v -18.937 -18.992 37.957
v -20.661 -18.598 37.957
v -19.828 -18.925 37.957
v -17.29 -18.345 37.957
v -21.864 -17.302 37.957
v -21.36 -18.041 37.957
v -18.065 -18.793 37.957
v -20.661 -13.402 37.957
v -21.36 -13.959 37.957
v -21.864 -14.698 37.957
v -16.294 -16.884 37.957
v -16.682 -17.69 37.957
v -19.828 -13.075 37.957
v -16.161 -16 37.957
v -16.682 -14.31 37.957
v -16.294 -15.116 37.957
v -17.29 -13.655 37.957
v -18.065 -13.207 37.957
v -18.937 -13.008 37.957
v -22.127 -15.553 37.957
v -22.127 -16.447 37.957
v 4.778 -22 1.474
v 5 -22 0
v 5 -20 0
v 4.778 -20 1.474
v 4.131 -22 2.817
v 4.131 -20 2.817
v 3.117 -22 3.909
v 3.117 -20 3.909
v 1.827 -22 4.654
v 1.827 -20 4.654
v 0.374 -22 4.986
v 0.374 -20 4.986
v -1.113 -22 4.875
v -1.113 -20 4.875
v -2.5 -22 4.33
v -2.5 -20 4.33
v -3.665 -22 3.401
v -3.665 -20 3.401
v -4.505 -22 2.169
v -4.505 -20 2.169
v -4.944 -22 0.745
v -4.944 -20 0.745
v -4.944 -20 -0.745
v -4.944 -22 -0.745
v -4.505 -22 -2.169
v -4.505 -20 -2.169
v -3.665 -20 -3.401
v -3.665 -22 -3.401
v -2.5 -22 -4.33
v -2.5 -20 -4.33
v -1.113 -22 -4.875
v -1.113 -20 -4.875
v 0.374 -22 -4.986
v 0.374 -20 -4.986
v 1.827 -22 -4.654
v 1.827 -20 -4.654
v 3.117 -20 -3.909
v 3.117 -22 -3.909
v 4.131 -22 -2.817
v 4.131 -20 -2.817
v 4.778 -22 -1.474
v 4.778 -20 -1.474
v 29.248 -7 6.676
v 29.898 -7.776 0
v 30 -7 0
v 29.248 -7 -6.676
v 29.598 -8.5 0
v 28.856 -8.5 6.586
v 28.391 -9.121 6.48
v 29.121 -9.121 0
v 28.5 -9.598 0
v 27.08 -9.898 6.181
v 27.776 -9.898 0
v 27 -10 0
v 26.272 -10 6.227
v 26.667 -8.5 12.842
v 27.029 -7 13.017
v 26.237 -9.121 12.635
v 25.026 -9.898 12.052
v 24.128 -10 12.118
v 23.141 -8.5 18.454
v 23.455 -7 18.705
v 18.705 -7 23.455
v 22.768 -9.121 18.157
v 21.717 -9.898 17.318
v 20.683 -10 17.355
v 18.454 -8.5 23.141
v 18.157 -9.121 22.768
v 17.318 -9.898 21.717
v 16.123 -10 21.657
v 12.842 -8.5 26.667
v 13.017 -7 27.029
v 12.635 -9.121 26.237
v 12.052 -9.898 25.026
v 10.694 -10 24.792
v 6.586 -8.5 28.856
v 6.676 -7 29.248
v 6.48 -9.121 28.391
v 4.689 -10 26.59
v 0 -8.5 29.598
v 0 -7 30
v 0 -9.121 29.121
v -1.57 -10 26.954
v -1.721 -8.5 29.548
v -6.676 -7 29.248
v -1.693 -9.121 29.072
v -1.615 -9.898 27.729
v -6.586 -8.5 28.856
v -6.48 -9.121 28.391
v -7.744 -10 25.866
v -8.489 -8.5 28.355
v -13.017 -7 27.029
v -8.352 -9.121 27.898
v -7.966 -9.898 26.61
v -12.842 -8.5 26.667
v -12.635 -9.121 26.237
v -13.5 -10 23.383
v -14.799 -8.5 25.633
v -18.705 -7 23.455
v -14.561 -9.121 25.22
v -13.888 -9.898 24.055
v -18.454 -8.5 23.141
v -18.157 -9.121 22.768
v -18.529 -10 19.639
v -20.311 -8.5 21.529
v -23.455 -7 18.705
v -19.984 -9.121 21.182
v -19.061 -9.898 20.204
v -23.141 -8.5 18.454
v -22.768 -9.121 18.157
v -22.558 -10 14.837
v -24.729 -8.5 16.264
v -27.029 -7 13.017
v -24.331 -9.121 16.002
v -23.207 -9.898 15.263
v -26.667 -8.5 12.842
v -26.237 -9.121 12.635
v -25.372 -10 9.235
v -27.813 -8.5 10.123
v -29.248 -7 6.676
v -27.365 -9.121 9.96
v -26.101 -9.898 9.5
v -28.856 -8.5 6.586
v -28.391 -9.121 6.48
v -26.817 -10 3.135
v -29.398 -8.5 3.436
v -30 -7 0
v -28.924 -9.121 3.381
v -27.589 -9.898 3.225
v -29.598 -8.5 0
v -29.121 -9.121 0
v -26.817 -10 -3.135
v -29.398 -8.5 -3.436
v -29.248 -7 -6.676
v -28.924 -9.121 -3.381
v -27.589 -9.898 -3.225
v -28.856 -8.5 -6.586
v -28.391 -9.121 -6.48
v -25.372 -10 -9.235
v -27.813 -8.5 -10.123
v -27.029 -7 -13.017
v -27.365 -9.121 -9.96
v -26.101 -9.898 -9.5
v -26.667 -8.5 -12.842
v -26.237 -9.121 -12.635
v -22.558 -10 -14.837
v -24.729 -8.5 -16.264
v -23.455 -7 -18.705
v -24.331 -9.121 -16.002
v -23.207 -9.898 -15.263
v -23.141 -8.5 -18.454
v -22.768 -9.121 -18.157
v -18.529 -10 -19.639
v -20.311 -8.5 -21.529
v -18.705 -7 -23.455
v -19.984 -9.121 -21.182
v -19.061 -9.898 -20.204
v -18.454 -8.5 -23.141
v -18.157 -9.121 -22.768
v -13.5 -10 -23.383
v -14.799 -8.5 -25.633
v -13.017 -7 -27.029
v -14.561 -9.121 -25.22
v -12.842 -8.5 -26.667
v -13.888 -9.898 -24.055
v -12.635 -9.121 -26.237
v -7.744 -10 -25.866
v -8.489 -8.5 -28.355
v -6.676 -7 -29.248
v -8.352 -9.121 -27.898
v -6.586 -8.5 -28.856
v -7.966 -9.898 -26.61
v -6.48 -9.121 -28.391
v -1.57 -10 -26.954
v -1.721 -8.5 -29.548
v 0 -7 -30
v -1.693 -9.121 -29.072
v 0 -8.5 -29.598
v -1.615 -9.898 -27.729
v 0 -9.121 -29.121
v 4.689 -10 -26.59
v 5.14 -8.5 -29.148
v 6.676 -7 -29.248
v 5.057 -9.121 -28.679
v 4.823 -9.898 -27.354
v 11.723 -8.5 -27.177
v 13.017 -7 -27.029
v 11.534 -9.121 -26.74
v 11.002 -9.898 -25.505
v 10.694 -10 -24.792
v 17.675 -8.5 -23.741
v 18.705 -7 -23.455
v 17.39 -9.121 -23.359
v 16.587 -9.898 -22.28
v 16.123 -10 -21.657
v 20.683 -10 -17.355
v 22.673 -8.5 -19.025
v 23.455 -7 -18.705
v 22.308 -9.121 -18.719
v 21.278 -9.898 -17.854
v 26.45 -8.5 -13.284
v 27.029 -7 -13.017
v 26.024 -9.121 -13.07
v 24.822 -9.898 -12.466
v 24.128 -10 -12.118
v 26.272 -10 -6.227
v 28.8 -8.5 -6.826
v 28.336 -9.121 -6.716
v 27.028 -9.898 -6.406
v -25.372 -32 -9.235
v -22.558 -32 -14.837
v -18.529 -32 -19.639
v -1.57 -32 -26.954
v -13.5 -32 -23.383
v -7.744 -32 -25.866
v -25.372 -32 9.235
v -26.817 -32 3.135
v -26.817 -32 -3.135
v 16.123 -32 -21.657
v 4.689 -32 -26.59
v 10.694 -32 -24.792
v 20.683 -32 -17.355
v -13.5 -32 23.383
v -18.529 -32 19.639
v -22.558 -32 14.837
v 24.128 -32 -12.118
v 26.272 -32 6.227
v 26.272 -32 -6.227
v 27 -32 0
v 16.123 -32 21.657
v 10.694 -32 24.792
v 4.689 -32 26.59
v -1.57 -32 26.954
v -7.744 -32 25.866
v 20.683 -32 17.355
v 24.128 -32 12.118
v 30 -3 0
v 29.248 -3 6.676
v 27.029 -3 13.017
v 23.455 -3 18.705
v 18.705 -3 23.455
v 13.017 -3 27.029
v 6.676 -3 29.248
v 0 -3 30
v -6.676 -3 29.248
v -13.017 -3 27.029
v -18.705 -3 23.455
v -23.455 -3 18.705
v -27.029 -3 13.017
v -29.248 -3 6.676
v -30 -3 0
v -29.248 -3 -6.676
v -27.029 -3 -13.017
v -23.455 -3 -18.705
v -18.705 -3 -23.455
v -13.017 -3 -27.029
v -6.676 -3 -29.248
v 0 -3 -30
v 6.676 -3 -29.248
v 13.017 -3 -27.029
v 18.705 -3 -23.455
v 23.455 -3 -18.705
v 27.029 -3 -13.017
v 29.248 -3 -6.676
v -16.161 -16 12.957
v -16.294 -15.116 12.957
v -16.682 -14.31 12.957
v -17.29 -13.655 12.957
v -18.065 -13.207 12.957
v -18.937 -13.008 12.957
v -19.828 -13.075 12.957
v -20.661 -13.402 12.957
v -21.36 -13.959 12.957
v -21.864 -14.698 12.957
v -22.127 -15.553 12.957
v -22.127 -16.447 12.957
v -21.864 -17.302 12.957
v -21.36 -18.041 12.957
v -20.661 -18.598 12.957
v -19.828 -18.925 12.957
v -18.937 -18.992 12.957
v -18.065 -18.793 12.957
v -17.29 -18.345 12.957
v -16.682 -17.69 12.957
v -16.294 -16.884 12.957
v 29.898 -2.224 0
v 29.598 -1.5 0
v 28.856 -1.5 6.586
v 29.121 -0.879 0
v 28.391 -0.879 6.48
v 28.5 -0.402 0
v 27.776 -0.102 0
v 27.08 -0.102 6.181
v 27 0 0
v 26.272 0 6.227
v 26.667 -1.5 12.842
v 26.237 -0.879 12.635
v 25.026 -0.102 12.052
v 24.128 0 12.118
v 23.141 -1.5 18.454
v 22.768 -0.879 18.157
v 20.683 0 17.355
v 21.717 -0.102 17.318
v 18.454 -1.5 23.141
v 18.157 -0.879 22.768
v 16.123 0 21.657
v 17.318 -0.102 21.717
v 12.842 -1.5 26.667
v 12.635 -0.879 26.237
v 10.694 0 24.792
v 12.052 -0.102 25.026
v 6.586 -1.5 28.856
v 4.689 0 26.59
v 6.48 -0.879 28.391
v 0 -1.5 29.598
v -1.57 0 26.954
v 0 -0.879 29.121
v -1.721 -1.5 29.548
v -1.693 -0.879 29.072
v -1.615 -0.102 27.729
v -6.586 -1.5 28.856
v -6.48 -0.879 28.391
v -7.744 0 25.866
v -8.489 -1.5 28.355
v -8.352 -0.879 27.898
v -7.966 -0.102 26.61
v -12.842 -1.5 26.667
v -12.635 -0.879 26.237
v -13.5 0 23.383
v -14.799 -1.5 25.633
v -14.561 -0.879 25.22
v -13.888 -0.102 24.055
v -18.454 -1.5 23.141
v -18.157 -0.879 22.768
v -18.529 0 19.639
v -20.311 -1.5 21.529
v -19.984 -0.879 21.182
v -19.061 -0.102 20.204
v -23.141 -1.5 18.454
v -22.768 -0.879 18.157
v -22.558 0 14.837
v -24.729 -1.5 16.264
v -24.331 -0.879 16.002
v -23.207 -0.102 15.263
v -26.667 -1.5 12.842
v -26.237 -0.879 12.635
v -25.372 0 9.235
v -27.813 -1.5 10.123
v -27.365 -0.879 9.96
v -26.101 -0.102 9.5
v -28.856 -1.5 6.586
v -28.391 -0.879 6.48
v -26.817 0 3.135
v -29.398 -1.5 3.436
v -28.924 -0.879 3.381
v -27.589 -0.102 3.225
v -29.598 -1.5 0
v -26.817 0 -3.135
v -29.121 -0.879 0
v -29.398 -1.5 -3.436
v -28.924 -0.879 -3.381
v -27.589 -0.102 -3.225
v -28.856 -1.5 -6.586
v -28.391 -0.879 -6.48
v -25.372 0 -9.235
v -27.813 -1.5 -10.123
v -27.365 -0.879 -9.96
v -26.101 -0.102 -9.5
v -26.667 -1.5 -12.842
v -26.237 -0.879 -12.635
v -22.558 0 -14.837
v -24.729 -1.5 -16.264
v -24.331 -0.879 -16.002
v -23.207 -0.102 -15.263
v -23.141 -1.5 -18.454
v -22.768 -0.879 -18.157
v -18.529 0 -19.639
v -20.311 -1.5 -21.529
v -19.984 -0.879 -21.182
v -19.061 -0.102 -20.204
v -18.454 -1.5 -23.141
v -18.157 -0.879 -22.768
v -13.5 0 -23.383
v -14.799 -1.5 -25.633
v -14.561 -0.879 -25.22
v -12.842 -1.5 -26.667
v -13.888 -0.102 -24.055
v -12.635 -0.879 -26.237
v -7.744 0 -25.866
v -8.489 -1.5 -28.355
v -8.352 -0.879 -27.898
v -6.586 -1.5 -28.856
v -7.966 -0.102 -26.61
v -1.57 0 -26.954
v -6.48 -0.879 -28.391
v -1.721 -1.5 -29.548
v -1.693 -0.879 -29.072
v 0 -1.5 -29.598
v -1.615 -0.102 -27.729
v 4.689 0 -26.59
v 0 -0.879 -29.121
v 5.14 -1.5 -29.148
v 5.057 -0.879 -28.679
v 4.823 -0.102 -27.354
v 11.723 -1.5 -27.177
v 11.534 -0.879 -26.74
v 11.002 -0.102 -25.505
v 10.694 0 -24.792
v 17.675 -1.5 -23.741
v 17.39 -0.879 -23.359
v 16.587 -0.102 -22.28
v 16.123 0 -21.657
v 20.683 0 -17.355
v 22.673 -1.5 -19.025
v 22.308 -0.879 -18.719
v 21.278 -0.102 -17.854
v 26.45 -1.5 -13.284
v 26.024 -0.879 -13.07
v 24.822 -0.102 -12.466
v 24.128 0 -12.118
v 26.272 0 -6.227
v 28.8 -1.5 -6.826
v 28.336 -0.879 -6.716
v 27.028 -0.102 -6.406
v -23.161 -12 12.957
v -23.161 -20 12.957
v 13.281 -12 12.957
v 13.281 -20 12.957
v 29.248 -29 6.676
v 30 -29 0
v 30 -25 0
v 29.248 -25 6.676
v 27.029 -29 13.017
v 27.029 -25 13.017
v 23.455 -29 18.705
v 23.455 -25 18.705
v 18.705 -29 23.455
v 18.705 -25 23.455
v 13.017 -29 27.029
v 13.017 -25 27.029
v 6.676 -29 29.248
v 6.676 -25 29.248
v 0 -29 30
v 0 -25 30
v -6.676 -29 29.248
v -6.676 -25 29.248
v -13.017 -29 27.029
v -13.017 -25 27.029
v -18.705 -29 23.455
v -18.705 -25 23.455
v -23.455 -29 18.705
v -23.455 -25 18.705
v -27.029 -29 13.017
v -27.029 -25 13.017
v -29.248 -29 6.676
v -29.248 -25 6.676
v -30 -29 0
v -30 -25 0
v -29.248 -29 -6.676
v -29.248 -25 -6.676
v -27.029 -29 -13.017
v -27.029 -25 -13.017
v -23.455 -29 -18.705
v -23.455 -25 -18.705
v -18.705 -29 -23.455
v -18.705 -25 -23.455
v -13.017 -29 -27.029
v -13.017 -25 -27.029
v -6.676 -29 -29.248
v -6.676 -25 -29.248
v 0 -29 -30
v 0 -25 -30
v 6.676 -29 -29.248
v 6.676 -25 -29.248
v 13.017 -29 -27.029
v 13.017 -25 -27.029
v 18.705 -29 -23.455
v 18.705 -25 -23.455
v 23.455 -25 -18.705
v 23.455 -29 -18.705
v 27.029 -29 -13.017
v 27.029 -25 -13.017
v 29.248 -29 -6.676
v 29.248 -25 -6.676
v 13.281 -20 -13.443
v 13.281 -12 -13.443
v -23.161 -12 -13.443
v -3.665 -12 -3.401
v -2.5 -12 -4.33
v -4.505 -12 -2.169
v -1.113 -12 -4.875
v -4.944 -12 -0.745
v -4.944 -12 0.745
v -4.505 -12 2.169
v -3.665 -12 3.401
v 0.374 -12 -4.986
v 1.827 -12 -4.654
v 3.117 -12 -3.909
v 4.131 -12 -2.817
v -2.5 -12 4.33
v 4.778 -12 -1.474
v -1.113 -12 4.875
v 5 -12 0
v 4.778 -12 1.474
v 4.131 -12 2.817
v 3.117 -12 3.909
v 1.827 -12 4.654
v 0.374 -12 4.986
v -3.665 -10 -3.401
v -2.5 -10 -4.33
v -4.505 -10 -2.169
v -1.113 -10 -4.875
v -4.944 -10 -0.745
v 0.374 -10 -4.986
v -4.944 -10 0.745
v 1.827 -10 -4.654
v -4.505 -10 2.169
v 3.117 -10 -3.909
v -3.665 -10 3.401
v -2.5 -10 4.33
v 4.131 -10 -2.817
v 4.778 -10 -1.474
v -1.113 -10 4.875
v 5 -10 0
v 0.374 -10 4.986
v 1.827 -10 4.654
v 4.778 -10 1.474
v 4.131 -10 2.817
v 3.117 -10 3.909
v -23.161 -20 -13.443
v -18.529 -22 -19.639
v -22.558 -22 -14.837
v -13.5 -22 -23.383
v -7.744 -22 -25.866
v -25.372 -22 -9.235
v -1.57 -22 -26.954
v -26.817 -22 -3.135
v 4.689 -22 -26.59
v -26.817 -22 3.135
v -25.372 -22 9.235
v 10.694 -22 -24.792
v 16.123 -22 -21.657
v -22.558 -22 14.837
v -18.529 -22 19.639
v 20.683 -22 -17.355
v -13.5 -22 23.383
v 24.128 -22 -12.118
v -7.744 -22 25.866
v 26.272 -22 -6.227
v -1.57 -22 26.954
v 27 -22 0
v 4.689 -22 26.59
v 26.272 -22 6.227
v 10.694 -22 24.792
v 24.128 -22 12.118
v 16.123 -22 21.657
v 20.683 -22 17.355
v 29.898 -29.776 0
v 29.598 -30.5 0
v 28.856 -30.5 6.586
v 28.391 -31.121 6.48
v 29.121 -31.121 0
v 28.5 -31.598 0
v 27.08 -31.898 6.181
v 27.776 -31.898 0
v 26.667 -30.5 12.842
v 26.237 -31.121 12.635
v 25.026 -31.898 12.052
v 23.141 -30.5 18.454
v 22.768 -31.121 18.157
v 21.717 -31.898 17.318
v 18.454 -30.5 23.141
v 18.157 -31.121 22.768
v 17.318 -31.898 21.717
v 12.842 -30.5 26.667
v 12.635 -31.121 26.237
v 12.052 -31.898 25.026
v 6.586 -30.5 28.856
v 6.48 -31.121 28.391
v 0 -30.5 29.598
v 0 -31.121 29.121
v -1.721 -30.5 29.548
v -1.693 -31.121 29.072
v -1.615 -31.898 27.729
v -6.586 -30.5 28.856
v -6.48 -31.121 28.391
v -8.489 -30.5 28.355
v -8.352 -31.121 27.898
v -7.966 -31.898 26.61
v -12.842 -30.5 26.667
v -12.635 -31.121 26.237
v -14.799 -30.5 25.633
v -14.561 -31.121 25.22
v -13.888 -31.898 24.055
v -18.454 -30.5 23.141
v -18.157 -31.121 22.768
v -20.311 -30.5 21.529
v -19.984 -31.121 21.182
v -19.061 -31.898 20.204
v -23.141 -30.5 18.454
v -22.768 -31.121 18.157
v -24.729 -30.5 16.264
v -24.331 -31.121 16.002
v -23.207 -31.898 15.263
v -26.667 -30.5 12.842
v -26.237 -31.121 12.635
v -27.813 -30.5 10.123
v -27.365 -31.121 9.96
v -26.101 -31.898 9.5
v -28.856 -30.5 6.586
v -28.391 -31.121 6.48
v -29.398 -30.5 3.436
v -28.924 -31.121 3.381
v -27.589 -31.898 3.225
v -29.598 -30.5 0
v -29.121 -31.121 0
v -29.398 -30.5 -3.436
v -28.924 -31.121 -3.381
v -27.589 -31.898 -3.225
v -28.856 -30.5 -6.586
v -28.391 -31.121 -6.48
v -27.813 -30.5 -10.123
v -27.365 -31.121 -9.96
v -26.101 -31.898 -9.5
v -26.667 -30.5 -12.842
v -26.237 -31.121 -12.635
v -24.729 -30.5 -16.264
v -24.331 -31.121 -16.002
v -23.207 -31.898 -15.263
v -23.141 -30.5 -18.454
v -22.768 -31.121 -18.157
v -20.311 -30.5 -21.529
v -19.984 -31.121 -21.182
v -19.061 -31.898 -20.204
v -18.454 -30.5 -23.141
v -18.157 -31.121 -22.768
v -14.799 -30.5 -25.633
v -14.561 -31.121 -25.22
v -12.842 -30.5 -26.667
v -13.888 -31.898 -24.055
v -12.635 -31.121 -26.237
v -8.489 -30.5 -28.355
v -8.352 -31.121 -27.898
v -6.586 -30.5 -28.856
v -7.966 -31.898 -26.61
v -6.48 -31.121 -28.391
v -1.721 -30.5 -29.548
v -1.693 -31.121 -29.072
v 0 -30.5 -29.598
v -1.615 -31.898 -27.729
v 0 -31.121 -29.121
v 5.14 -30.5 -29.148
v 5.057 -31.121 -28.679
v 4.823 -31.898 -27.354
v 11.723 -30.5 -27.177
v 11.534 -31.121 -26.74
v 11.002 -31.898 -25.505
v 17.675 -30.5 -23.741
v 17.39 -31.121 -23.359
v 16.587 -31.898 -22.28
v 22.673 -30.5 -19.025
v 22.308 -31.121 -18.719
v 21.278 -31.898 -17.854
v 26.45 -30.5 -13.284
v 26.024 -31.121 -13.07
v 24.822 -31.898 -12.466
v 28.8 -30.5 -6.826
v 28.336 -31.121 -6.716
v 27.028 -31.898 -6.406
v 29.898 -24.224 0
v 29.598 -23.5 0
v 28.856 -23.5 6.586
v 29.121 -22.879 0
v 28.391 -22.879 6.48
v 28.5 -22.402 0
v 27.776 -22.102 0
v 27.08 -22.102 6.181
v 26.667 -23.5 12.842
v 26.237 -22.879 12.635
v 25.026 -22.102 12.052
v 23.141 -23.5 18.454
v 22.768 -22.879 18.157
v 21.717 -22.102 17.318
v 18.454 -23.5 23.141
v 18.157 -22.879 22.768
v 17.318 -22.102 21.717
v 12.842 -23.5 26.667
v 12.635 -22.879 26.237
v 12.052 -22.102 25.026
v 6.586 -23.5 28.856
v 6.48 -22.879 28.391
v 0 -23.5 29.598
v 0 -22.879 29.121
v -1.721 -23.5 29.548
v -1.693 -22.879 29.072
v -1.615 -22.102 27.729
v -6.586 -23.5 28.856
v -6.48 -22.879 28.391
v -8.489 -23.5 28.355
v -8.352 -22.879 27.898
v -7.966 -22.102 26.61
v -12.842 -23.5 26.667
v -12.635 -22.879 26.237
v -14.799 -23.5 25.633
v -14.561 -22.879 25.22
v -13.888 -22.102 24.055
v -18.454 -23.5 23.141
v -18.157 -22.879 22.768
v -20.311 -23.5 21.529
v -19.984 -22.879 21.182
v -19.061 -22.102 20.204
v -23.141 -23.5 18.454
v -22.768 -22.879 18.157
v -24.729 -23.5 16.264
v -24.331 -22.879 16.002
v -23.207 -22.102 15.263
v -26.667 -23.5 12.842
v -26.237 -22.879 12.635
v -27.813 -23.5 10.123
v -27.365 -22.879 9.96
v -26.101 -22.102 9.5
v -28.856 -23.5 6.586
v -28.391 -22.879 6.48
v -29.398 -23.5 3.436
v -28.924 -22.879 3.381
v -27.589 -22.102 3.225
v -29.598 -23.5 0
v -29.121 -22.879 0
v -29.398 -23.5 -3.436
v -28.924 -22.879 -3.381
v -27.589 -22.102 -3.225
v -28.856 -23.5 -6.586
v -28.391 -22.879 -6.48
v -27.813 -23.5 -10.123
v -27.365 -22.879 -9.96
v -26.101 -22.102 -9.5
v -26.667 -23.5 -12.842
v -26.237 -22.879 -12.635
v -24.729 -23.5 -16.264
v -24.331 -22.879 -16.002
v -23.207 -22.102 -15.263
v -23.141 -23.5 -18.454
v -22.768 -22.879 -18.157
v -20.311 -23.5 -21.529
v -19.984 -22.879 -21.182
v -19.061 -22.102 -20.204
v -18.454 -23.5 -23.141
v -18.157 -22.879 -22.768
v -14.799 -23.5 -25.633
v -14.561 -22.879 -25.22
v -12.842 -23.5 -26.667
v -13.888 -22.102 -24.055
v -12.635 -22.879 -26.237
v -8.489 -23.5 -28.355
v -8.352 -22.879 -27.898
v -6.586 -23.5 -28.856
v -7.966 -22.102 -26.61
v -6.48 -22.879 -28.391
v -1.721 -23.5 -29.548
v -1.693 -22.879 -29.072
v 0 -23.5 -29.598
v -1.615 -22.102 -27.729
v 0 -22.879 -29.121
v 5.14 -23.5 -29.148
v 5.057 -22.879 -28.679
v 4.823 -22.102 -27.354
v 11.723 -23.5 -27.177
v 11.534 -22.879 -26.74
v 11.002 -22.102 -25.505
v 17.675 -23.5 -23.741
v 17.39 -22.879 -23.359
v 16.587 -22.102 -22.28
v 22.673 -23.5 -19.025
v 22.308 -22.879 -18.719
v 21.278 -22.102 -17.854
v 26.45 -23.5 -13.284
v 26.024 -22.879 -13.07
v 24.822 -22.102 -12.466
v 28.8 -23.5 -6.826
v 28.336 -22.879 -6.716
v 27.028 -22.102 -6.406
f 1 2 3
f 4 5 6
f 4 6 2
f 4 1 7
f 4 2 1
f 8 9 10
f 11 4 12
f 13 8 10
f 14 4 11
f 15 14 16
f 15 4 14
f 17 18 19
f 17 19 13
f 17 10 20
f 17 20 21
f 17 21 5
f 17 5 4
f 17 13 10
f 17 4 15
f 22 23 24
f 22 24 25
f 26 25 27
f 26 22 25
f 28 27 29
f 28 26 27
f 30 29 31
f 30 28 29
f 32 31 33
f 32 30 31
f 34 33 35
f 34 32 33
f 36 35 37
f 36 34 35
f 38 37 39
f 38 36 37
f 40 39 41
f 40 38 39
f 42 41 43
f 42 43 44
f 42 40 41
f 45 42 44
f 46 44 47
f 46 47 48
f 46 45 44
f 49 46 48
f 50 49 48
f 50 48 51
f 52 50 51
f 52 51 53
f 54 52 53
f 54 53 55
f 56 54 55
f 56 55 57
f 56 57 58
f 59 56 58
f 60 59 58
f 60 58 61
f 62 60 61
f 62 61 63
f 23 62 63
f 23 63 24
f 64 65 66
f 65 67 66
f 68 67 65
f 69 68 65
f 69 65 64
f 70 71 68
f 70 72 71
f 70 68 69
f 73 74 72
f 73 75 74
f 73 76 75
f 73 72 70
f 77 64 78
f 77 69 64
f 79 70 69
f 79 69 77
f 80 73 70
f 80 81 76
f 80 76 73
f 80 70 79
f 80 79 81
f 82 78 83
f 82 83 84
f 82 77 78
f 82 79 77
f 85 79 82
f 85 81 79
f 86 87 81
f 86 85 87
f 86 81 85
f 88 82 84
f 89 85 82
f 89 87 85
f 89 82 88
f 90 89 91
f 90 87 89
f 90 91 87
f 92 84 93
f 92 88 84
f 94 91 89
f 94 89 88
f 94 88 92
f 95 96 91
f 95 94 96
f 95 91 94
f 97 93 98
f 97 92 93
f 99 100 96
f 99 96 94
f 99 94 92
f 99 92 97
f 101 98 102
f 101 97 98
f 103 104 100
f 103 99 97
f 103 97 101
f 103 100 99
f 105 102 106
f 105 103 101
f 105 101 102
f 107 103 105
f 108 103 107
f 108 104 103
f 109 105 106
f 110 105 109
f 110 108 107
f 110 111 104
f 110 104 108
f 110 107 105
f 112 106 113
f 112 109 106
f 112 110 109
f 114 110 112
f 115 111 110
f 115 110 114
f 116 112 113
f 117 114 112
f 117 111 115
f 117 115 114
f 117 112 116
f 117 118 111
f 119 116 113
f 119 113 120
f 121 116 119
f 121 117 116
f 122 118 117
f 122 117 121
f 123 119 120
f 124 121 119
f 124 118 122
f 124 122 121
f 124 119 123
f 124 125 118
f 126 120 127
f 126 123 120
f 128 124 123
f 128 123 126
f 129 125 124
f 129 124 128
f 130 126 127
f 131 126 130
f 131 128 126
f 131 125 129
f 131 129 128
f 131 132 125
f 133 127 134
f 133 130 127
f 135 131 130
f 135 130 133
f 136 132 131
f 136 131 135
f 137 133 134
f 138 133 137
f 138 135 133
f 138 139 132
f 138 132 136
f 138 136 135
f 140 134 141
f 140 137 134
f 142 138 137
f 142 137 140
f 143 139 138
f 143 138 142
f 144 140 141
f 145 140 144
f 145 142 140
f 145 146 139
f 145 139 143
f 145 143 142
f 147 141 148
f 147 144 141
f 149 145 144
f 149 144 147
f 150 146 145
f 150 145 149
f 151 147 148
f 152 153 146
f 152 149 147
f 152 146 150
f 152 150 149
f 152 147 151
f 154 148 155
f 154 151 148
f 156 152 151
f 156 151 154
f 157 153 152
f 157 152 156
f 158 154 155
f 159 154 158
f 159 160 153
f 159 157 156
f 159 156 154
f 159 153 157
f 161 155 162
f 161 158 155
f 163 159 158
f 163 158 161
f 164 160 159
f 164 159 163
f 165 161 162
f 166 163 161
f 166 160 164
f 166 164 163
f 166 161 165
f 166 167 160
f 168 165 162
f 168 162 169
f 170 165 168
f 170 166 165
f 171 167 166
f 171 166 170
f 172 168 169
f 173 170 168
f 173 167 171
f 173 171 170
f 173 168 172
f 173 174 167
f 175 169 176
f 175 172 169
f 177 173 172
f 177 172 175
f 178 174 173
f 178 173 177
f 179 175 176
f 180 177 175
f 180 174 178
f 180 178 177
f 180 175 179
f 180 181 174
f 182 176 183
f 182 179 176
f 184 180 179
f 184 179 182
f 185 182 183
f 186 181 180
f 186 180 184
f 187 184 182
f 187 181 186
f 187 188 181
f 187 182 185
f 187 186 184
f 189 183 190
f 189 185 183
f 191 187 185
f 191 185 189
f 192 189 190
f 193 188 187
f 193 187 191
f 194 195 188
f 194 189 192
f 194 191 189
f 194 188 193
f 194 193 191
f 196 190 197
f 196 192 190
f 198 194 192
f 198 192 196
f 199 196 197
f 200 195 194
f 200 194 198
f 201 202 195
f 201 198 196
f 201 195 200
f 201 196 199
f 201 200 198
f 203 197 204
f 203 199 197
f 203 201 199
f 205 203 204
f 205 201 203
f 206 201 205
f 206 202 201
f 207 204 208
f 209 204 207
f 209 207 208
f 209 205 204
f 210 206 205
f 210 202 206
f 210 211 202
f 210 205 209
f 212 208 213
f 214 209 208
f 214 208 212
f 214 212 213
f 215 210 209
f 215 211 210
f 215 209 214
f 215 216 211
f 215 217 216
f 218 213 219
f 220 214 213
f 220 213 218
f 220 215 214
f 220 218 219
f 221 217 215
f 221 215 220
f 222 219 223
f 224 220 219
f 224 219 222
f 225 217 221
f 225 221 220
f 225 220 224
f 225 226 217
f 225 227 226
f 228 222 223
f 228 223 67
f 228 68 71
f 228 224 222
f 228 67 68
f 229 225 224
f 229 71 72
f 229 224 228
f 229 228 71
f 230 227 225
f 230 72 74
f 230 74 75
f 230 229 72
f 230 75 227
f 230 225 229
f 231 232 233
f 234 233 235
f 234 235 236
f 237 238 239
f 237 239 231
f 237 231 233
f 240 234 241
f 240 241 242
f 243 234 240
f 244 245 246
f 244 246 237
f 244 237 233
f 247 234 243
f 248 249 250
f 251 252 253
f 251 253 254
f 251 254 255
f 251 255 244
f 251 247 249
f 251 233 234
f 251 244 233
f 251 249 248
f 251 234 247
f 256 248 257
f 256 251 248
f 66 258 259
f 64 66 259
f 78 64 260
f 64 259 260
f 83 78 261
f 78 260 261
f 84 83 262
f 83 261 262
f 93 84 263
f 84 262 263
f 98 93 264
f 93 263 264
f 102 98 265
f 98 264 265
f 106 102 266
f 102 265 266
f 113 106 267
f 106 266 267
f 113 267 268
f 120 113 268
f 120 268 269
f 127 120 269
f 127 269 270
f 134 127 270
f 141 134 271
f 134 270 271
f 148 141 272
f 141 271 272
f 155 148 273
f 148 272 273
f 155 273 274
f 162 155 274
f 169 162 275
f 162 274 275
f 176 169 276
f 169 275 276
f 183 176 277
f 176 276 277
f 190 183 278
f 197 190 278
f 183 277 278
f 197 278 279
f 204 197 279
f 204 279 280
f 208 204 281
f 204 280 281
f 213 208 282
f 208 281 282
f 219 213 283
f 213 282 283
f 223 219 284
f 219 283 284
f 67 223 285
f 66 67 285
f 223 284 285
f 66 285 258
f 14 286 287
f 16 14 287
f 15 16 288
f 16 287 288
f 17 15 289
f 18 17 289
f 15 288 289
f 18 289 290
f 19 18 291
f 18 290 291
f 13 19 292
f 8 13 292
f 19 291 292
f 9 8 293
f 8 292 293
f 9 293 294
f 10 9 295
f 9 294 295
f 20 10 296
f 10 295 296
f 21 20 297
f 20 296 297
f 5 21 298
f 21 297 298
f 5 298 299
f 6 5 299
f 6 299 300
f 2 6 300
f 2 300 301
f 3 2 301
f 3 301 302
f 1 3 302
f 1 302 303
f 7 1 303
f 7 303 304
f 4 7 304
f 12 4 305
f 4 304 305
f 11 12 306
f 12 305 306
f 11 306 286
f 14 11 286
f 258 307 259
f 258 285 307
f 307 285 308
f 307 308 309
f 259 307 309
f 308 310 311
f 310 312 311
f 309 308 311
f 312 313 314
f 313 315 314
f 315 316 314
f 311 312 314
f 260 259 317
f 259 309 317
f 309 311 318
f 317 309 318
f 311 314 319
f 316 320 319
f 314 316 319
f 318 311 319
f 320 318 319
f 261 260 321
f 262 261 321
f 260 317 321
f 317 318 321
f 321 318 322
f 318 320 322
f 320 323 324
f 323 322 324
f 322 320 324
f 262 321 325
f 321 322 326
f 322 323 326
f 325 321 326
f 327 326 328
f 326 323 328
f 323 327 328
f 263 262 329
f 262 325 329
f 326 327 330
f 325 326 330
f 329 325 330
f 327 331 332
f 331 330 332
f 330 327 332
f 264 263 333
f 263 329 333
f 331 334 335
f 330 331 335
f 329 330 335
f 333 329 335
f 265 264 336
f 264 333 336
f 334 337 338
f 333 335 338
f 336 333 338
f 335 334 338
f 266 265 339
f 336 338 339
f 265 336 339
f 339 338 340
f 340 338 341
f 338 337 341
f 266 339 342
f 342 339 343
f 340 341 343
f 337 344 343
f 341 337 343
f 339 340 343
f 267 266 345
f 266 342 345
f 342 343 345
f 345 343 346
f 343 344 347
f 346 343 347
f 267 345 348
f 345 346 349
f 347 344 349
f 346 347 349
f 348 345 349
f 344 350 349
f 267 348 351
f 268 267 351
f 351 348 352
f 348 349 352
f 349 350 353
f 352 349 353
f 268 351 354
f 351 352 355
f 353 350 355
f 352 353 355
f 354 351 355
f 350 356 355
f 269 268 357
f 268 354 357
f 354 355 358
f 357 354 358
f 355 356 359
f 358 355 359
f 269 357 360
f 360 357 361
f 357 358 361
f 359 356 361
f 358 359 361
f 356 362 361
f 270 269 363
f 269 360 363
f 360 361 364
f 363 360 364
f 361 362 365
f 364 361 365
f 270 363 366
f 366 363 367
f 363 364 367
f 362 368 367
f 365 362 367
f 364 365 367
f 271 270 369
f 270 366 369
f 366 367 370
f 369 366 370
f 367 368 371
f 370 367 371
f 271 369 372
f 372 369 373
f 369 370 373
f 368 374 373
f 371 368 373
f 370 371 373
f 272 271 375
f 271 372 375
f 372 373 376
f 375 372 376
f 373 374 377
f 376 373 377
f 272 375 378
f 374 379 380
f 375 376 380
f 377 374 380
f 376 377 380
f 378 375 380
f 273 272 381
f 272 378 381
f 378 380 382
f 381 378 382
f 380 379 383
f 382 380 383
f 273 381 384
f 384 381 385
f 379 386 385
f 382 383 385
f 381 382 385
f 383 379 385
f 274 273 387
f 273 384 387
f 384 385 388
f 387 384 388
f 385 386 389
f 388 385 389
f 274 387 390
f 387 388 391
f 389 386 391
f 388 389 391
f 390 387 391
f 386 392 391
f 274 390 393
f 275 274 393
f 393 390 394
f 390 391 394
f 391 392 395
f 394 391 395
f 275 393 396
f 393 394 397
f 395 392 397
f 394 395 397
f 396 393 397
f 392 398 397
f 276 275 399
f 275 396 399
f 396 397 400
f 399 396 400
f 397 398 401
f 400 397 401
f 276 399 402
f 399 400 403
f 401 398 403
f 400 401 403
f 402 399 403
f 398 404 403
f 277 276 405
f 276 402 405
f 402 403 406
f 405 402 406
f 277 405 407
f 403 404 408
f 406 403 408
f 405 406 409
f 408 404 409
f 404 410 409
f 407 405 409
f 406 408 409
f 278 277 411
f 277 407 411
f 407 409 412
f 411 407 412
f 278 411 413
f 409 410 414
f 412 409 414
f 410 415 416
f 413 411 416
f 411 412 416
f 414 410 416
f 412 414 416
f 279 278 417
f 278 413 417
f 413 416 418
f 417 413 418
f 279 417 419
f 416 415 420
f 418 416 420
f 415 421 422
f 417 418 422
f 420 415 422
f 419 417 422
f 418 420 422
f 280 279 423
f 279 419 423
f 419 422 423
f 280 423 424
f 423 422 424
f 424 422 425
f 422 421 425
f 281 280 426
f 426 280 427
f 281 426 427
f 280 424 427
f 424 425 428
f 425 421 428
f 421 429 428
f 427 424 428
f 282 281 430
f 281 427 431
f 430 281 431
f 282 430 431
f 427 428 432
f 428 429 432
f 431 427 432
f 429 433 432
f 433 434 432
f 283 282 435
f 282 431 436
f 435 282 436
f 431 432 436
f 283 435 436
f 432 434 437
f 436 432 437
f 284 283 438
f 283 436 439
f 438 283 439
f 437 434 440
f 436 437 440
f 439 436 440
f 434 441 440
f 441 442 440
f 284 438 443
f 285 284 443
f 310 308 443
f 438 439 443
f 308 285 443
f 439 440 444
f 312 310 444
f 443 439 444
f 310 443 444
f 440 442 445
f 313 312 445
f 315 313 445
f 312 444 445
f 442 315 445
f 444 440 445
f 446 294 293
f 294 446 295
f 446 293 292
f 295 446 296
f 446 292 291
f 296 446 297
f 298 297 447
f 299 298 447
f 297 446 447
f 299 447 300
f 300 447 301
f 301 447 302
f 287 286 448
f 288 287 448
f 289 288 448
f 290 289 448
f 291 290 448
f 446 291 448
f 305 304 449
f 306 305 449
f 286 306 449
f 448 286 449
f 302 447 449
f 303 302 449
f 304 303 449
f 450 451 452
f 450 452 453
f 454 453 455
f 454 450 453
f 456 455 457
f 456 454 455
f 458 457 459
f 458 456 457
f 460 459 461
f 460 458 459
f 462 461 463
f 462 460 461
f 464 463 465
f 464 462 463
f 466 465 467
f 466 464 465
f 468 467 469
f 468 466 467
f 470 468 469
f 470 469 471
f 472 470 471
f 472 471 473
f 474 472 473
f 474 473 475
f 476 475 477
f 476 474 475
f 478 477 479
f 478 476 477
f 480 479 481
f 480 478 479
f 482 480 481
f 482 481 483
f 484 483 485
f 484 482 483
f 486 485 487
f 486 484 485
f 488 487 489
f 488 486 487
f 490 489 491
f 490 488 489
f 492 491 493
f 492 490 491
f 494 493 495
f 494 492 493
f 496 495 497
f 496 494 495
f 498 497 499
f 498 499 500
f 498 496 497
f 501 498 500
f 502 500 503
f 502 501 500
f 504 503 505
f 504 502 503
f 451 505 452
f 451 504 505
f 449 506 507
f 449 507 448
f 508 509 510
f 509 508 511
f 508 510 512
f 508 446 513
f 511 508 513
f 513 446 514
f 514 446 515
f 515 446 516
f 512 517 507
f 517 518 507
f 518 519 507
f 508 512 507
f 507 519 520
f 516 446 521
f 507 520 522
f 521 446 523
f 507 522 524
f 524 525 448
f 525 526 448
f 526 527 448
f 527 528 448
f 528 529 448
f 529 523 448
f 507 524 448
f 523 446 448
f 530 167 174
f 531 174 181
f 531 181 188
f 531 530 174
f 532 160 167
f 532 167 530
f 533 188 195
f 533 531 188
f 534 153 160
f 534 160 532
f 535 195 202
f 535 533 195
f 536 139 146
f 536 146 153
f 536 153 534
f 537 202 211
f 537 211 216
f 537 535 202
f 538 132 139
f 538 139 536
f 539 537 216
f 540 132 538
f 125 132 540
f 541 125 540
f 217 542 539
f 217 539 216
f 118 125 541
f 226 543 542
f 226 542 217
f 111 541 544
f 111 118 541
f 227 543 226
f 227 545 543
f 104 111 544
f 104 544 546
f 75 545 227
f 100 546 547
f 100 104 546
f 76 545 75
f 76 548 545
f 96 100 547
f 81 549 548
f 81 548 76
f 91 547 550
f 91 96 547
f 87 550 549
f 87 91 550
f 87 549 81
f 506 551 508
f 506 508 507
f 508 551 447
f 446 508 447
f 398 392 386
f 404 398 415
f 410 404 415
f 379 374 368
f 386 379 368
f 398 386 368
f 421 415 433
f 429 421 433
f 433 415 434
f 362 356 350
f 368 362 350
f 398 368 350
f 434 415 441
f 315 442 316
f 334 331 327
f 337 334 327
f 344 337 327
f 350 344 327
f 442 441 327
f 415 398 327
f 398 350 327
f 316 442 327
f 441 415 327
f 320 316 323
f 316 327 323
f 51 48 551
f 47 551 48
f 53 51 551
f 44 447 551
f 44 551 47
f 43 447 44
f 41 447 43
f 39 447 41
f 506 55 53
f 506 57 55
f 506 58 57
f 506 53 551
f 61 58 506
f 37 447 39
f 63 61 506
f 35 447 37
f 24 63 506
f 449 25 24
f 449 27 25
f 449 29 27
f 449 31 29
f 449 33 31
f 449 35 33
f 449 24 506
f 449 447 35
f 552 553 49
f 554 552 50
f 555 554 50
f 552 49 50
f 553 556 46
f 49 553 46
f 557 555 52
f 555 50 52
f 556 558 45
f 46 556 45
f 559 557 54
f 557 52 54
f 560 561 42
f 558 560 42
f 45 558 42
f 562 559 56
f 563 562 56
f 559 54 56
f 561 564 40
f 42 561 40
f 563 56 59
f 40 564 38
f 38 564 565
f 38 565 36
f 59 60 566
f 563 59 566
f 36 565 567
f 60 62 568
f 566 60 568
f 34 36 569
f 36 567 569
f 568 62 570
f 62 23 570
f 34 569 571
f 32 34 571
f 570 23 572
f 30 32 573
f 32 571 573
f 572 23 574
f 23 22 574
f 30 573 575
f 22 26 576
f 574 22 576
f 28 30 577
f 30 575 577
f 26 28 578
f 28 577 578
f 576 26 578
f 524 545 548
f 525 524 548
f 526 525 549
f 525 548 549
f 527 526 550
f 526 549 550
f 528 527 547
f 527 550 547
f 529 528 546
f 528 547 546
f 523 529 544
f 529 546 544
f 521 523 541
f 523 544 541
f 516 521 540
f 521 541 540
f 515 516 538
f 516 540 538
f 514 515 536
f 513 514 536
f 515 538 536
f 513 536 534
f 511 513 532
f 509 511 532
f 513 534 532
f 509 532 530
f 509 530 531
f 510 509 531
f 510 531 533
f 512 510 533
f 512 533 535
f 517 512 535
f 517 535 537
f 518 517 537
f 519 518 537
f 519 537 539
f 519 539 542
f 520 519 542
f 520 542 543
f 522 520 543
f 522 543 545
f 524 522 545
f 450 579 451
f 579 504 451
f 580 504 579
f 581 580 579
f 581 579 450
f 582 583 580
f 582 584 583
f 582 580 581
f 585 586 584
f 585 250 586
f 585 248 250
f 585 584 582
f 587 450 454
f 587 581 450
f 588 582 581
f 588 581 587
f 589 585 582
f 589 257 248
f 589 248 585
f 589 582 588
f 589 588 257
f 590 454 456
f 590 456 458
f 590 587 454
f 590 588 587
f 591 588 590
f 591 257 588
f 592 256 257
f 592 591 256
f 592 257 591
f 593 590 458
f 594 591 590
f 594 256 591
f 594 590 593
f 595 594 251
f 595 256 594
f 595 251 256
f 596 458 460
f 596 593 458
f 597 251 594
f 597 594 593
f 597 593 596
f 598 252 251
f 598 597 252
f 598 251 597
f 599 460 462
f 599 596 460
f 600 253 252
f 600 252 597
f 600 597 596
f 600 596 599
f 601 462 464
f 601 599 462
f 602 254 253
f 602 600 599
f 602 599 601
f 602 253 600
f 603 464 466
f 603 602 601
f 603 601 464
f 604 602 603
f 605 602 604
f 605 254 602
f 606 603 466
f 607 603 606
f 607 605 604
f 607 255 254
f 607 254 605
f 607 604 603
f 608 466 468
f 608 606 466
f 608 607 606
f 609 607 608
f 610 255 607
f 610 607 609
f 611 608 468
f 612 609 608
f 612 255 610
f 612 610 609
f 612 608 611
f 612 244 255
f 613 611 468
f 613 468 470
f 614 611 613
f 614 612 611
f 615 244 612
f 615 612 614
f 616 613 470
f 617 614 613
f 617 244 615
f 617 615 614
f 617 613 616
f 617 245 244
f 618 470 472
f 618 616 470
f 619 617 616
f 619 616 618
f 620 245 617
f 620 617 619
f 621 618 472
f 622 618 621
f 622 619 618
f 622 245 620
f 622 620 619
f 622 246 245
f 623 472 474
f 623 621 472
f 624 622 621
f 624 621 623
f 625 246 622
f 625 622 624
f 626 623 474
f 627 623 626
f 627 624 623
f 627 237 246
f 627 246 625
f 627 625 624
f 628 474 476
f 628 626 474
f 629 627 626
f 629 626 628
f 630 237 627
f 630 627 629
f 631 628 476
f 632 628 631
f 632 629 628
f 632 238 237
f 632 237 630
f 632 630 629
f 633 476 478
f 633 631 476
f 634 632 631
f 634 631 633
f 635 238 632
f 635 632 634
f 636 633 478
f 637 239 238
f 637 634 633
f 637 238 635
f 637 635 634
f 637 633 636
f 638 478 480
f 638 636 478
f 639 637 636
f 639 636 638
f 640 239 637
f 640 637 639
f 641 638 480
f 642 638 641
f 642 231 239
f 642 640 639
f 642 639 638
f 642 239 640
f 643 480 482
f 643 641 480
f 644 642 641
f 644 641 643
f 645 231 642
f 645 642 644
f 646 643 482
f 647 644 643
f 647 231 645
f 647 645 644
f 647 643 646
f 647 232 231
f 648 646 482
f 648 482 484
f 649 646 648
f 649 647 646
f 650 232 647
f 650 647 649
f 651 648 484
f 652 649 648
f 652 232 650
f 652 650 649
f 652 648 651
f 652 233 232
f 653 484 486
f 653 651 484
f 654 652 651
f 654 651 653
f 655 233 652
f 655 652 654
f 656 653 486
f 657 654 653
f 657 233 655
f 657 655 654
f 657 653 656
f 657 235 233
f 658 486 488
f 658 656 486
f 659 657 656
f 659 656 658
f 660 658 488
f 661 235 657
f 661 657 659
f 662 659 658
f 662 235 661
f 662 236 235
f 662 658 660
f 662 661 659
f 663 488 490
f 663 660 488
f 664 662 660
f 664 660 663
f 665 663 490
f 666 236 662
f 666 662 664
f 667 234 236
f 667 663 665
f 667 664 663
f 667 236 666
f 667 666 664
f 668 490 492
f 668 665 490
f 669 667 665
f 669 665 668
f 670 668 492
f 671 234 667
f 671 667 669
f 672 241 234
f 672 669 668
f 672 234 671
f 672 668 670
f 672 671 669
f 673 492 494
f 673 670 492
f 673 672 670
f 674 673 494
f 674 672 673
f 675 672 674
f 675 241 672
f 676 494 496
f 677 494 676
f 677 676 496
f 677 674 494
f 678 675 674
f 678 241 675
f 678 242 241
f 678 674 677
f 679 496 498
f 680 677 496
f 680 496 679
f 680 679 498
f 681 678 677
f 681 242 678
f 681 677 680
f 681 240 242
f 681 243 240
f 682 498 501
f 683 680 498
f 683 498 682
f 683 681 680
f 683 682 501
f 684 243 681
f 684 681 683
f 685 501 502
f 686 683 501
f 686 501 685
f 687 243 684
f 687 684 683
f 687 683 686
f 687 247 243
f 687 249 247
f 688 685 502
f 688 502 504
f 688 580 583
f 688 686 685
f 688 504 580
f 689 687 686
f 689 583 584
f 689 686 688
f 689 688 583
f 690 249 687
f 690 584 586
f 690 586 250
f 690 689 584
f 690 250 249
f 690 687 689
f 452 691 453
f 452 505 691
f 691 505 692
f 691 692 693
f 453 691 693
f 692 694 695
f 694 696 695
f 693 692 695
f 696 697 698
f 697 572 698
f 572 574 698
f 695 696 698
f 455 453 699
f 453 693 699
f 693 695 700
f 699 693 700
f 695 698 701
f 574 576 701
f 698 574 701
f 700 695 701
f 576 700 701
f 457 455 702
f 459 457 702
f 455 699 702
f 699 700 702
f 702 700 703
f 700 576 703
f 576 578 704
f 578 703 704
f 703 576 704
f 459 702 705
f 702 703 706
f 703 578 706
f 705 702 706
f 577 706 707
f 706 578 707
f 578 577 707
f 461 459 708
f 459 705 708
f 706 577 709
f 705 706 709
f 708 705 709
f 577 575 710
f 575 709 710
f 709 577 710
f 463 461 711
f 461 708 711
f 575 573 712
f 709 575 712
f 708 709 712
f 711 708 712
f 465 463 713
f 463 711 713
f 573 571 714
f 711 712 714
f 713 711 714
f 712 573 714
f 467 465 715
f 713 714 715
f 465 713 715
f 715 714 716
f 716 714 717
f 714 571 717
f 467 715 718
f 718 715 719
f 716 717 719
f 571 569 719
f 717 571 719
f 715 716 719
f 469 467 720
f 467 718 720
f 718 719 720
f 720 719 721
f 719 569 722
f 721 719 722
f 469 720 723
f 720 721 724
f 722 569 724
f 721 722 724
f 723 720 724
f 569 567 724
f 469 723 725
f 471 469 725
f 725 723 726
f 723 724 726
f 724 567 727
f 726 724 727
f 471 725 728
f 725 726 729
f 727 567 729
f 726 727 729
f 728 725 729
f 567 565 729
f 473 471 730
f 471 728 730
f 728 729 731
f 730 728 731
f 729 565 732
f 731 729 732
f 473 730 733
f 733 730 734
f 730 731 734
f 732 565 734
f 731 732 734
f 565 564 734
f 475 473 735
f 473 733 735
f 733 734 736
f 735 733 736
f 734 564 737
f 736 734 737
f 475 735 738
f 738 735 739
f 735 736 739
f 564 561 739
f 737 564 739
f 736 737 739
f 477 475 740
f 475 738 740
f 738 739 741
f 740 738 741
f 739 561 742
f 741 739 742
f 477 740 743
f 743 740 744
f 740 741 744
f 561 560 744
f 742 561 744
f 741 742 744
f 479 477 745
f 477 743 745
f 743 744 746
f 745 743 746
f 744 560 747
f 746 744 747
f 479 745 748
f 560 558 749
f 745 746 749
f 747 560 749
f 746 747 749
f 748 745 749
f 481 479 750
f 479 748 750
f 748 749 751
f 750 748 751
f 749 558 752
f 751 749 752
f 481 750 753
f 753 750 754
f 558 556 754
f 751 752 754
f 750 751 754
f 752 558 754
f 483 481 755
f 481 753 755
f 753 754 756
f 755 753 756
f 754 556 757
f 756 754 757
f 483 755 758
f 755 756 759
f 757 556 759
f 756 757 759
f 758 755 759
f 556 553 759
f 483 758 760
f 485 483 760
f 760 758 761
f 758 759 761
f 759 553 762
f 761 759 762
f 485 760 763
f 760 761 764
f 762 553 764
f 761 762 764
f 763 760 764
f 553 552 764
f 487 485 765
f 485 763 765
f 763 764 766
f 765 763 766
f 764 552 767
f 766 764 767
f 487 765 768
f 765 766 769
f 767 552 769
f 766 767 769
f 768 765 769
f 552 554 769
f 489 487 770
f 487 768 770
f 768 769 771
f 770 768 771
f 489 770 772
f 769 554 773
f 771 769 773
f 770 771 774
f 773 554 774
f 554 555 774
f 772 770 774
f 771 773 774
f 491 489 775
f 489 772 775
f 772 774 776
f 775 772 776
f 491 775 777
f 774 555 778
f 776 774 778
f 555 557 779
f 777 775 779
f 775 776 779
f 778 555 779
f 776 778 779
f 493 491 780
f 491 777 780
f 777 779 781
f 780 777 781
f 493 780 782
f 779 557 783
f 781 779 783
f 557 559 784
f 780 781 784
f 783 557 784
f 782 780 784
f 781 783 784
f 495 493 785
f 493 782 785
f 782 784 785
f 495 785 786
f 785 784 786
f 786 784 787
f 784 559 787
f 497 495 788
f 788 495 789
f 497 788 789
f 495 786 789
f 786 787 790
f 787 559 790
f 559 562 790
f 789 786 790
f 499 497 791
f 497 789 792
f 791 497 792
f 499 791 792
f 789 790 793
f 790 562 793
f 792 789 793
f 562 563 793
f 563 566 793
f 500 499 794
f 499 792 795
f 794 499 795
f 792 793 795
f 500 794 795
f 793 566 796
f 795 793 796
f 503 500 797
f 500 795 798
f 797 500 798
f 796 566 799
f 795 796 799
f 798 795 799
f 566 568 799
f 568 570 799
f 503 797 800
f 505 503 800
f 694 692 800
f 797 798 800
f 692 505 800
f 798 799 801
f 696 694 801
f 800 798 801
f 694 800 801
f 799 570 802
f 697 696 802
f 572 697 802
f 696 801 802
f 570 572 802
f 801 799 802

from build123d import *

# Parameters (mm, degrees)
F0_R     = 30
F1_DEPTH = 10
F2_R     = 3
F3_R     = 5
F4_DEPTH = 6
F6_W     = 36.4418011159
F6_H     = 26.4000613242
F6_R     = 5
F7_DEPTH = 4
F8_R     = 3
F9_DEPTH = 25


with BuildPart() as f1:
    # F0 (on Front) → F1 (new body)
    with BuildSketch(Plane.XZ):
        Circle(F0_R)
    extrude(amount=F1_DEPTH)

    # F2
    f2_edges = [f1.edges().sort_by_distance(p)[0] for p in [
        (30, -5, 0),
        (-30, 0, 0),
        (-30, -10, 0),
    ]]
    fillet(f2_edges, radius=F2_R)

    # F3 (on face) → F4 (join)
    with BuildSketch(Plane.XZ.offset(10)):
        Circle(F3_R)
    extrude(amount=F4_DEPTH)


with BuildPart() as f5_1:
    # F5: instance of F1
    add(f1.part.mirror(Plane.XZ.offset(16)))


with BuildPart() as f1_1:
    add(f1.part)

    add(f5_1.part)  # F7 merges F5_1
    # F6 (on face) → F7 (join, symmetric)
    with BuildSketch(Plane.XZ.offset(16)):
        with Locations((-4.939888604, -0.2429457381)):
            Rectangle(F6_W, F6_H)
        Circle(F6_R, mode=Mode.SUBTRACT)
    extrude(amount=F7_DEPTH, both=True)

    # F8 (on face) → F9 (join)
    with BuildSketch(Plane.XY.offset(12.957084924)):
        with Locations((-19.1607891619, -16)):
            Circle(F8_R)
    extrude(amount=F9_DEPTH)


solid = f1_1.part
